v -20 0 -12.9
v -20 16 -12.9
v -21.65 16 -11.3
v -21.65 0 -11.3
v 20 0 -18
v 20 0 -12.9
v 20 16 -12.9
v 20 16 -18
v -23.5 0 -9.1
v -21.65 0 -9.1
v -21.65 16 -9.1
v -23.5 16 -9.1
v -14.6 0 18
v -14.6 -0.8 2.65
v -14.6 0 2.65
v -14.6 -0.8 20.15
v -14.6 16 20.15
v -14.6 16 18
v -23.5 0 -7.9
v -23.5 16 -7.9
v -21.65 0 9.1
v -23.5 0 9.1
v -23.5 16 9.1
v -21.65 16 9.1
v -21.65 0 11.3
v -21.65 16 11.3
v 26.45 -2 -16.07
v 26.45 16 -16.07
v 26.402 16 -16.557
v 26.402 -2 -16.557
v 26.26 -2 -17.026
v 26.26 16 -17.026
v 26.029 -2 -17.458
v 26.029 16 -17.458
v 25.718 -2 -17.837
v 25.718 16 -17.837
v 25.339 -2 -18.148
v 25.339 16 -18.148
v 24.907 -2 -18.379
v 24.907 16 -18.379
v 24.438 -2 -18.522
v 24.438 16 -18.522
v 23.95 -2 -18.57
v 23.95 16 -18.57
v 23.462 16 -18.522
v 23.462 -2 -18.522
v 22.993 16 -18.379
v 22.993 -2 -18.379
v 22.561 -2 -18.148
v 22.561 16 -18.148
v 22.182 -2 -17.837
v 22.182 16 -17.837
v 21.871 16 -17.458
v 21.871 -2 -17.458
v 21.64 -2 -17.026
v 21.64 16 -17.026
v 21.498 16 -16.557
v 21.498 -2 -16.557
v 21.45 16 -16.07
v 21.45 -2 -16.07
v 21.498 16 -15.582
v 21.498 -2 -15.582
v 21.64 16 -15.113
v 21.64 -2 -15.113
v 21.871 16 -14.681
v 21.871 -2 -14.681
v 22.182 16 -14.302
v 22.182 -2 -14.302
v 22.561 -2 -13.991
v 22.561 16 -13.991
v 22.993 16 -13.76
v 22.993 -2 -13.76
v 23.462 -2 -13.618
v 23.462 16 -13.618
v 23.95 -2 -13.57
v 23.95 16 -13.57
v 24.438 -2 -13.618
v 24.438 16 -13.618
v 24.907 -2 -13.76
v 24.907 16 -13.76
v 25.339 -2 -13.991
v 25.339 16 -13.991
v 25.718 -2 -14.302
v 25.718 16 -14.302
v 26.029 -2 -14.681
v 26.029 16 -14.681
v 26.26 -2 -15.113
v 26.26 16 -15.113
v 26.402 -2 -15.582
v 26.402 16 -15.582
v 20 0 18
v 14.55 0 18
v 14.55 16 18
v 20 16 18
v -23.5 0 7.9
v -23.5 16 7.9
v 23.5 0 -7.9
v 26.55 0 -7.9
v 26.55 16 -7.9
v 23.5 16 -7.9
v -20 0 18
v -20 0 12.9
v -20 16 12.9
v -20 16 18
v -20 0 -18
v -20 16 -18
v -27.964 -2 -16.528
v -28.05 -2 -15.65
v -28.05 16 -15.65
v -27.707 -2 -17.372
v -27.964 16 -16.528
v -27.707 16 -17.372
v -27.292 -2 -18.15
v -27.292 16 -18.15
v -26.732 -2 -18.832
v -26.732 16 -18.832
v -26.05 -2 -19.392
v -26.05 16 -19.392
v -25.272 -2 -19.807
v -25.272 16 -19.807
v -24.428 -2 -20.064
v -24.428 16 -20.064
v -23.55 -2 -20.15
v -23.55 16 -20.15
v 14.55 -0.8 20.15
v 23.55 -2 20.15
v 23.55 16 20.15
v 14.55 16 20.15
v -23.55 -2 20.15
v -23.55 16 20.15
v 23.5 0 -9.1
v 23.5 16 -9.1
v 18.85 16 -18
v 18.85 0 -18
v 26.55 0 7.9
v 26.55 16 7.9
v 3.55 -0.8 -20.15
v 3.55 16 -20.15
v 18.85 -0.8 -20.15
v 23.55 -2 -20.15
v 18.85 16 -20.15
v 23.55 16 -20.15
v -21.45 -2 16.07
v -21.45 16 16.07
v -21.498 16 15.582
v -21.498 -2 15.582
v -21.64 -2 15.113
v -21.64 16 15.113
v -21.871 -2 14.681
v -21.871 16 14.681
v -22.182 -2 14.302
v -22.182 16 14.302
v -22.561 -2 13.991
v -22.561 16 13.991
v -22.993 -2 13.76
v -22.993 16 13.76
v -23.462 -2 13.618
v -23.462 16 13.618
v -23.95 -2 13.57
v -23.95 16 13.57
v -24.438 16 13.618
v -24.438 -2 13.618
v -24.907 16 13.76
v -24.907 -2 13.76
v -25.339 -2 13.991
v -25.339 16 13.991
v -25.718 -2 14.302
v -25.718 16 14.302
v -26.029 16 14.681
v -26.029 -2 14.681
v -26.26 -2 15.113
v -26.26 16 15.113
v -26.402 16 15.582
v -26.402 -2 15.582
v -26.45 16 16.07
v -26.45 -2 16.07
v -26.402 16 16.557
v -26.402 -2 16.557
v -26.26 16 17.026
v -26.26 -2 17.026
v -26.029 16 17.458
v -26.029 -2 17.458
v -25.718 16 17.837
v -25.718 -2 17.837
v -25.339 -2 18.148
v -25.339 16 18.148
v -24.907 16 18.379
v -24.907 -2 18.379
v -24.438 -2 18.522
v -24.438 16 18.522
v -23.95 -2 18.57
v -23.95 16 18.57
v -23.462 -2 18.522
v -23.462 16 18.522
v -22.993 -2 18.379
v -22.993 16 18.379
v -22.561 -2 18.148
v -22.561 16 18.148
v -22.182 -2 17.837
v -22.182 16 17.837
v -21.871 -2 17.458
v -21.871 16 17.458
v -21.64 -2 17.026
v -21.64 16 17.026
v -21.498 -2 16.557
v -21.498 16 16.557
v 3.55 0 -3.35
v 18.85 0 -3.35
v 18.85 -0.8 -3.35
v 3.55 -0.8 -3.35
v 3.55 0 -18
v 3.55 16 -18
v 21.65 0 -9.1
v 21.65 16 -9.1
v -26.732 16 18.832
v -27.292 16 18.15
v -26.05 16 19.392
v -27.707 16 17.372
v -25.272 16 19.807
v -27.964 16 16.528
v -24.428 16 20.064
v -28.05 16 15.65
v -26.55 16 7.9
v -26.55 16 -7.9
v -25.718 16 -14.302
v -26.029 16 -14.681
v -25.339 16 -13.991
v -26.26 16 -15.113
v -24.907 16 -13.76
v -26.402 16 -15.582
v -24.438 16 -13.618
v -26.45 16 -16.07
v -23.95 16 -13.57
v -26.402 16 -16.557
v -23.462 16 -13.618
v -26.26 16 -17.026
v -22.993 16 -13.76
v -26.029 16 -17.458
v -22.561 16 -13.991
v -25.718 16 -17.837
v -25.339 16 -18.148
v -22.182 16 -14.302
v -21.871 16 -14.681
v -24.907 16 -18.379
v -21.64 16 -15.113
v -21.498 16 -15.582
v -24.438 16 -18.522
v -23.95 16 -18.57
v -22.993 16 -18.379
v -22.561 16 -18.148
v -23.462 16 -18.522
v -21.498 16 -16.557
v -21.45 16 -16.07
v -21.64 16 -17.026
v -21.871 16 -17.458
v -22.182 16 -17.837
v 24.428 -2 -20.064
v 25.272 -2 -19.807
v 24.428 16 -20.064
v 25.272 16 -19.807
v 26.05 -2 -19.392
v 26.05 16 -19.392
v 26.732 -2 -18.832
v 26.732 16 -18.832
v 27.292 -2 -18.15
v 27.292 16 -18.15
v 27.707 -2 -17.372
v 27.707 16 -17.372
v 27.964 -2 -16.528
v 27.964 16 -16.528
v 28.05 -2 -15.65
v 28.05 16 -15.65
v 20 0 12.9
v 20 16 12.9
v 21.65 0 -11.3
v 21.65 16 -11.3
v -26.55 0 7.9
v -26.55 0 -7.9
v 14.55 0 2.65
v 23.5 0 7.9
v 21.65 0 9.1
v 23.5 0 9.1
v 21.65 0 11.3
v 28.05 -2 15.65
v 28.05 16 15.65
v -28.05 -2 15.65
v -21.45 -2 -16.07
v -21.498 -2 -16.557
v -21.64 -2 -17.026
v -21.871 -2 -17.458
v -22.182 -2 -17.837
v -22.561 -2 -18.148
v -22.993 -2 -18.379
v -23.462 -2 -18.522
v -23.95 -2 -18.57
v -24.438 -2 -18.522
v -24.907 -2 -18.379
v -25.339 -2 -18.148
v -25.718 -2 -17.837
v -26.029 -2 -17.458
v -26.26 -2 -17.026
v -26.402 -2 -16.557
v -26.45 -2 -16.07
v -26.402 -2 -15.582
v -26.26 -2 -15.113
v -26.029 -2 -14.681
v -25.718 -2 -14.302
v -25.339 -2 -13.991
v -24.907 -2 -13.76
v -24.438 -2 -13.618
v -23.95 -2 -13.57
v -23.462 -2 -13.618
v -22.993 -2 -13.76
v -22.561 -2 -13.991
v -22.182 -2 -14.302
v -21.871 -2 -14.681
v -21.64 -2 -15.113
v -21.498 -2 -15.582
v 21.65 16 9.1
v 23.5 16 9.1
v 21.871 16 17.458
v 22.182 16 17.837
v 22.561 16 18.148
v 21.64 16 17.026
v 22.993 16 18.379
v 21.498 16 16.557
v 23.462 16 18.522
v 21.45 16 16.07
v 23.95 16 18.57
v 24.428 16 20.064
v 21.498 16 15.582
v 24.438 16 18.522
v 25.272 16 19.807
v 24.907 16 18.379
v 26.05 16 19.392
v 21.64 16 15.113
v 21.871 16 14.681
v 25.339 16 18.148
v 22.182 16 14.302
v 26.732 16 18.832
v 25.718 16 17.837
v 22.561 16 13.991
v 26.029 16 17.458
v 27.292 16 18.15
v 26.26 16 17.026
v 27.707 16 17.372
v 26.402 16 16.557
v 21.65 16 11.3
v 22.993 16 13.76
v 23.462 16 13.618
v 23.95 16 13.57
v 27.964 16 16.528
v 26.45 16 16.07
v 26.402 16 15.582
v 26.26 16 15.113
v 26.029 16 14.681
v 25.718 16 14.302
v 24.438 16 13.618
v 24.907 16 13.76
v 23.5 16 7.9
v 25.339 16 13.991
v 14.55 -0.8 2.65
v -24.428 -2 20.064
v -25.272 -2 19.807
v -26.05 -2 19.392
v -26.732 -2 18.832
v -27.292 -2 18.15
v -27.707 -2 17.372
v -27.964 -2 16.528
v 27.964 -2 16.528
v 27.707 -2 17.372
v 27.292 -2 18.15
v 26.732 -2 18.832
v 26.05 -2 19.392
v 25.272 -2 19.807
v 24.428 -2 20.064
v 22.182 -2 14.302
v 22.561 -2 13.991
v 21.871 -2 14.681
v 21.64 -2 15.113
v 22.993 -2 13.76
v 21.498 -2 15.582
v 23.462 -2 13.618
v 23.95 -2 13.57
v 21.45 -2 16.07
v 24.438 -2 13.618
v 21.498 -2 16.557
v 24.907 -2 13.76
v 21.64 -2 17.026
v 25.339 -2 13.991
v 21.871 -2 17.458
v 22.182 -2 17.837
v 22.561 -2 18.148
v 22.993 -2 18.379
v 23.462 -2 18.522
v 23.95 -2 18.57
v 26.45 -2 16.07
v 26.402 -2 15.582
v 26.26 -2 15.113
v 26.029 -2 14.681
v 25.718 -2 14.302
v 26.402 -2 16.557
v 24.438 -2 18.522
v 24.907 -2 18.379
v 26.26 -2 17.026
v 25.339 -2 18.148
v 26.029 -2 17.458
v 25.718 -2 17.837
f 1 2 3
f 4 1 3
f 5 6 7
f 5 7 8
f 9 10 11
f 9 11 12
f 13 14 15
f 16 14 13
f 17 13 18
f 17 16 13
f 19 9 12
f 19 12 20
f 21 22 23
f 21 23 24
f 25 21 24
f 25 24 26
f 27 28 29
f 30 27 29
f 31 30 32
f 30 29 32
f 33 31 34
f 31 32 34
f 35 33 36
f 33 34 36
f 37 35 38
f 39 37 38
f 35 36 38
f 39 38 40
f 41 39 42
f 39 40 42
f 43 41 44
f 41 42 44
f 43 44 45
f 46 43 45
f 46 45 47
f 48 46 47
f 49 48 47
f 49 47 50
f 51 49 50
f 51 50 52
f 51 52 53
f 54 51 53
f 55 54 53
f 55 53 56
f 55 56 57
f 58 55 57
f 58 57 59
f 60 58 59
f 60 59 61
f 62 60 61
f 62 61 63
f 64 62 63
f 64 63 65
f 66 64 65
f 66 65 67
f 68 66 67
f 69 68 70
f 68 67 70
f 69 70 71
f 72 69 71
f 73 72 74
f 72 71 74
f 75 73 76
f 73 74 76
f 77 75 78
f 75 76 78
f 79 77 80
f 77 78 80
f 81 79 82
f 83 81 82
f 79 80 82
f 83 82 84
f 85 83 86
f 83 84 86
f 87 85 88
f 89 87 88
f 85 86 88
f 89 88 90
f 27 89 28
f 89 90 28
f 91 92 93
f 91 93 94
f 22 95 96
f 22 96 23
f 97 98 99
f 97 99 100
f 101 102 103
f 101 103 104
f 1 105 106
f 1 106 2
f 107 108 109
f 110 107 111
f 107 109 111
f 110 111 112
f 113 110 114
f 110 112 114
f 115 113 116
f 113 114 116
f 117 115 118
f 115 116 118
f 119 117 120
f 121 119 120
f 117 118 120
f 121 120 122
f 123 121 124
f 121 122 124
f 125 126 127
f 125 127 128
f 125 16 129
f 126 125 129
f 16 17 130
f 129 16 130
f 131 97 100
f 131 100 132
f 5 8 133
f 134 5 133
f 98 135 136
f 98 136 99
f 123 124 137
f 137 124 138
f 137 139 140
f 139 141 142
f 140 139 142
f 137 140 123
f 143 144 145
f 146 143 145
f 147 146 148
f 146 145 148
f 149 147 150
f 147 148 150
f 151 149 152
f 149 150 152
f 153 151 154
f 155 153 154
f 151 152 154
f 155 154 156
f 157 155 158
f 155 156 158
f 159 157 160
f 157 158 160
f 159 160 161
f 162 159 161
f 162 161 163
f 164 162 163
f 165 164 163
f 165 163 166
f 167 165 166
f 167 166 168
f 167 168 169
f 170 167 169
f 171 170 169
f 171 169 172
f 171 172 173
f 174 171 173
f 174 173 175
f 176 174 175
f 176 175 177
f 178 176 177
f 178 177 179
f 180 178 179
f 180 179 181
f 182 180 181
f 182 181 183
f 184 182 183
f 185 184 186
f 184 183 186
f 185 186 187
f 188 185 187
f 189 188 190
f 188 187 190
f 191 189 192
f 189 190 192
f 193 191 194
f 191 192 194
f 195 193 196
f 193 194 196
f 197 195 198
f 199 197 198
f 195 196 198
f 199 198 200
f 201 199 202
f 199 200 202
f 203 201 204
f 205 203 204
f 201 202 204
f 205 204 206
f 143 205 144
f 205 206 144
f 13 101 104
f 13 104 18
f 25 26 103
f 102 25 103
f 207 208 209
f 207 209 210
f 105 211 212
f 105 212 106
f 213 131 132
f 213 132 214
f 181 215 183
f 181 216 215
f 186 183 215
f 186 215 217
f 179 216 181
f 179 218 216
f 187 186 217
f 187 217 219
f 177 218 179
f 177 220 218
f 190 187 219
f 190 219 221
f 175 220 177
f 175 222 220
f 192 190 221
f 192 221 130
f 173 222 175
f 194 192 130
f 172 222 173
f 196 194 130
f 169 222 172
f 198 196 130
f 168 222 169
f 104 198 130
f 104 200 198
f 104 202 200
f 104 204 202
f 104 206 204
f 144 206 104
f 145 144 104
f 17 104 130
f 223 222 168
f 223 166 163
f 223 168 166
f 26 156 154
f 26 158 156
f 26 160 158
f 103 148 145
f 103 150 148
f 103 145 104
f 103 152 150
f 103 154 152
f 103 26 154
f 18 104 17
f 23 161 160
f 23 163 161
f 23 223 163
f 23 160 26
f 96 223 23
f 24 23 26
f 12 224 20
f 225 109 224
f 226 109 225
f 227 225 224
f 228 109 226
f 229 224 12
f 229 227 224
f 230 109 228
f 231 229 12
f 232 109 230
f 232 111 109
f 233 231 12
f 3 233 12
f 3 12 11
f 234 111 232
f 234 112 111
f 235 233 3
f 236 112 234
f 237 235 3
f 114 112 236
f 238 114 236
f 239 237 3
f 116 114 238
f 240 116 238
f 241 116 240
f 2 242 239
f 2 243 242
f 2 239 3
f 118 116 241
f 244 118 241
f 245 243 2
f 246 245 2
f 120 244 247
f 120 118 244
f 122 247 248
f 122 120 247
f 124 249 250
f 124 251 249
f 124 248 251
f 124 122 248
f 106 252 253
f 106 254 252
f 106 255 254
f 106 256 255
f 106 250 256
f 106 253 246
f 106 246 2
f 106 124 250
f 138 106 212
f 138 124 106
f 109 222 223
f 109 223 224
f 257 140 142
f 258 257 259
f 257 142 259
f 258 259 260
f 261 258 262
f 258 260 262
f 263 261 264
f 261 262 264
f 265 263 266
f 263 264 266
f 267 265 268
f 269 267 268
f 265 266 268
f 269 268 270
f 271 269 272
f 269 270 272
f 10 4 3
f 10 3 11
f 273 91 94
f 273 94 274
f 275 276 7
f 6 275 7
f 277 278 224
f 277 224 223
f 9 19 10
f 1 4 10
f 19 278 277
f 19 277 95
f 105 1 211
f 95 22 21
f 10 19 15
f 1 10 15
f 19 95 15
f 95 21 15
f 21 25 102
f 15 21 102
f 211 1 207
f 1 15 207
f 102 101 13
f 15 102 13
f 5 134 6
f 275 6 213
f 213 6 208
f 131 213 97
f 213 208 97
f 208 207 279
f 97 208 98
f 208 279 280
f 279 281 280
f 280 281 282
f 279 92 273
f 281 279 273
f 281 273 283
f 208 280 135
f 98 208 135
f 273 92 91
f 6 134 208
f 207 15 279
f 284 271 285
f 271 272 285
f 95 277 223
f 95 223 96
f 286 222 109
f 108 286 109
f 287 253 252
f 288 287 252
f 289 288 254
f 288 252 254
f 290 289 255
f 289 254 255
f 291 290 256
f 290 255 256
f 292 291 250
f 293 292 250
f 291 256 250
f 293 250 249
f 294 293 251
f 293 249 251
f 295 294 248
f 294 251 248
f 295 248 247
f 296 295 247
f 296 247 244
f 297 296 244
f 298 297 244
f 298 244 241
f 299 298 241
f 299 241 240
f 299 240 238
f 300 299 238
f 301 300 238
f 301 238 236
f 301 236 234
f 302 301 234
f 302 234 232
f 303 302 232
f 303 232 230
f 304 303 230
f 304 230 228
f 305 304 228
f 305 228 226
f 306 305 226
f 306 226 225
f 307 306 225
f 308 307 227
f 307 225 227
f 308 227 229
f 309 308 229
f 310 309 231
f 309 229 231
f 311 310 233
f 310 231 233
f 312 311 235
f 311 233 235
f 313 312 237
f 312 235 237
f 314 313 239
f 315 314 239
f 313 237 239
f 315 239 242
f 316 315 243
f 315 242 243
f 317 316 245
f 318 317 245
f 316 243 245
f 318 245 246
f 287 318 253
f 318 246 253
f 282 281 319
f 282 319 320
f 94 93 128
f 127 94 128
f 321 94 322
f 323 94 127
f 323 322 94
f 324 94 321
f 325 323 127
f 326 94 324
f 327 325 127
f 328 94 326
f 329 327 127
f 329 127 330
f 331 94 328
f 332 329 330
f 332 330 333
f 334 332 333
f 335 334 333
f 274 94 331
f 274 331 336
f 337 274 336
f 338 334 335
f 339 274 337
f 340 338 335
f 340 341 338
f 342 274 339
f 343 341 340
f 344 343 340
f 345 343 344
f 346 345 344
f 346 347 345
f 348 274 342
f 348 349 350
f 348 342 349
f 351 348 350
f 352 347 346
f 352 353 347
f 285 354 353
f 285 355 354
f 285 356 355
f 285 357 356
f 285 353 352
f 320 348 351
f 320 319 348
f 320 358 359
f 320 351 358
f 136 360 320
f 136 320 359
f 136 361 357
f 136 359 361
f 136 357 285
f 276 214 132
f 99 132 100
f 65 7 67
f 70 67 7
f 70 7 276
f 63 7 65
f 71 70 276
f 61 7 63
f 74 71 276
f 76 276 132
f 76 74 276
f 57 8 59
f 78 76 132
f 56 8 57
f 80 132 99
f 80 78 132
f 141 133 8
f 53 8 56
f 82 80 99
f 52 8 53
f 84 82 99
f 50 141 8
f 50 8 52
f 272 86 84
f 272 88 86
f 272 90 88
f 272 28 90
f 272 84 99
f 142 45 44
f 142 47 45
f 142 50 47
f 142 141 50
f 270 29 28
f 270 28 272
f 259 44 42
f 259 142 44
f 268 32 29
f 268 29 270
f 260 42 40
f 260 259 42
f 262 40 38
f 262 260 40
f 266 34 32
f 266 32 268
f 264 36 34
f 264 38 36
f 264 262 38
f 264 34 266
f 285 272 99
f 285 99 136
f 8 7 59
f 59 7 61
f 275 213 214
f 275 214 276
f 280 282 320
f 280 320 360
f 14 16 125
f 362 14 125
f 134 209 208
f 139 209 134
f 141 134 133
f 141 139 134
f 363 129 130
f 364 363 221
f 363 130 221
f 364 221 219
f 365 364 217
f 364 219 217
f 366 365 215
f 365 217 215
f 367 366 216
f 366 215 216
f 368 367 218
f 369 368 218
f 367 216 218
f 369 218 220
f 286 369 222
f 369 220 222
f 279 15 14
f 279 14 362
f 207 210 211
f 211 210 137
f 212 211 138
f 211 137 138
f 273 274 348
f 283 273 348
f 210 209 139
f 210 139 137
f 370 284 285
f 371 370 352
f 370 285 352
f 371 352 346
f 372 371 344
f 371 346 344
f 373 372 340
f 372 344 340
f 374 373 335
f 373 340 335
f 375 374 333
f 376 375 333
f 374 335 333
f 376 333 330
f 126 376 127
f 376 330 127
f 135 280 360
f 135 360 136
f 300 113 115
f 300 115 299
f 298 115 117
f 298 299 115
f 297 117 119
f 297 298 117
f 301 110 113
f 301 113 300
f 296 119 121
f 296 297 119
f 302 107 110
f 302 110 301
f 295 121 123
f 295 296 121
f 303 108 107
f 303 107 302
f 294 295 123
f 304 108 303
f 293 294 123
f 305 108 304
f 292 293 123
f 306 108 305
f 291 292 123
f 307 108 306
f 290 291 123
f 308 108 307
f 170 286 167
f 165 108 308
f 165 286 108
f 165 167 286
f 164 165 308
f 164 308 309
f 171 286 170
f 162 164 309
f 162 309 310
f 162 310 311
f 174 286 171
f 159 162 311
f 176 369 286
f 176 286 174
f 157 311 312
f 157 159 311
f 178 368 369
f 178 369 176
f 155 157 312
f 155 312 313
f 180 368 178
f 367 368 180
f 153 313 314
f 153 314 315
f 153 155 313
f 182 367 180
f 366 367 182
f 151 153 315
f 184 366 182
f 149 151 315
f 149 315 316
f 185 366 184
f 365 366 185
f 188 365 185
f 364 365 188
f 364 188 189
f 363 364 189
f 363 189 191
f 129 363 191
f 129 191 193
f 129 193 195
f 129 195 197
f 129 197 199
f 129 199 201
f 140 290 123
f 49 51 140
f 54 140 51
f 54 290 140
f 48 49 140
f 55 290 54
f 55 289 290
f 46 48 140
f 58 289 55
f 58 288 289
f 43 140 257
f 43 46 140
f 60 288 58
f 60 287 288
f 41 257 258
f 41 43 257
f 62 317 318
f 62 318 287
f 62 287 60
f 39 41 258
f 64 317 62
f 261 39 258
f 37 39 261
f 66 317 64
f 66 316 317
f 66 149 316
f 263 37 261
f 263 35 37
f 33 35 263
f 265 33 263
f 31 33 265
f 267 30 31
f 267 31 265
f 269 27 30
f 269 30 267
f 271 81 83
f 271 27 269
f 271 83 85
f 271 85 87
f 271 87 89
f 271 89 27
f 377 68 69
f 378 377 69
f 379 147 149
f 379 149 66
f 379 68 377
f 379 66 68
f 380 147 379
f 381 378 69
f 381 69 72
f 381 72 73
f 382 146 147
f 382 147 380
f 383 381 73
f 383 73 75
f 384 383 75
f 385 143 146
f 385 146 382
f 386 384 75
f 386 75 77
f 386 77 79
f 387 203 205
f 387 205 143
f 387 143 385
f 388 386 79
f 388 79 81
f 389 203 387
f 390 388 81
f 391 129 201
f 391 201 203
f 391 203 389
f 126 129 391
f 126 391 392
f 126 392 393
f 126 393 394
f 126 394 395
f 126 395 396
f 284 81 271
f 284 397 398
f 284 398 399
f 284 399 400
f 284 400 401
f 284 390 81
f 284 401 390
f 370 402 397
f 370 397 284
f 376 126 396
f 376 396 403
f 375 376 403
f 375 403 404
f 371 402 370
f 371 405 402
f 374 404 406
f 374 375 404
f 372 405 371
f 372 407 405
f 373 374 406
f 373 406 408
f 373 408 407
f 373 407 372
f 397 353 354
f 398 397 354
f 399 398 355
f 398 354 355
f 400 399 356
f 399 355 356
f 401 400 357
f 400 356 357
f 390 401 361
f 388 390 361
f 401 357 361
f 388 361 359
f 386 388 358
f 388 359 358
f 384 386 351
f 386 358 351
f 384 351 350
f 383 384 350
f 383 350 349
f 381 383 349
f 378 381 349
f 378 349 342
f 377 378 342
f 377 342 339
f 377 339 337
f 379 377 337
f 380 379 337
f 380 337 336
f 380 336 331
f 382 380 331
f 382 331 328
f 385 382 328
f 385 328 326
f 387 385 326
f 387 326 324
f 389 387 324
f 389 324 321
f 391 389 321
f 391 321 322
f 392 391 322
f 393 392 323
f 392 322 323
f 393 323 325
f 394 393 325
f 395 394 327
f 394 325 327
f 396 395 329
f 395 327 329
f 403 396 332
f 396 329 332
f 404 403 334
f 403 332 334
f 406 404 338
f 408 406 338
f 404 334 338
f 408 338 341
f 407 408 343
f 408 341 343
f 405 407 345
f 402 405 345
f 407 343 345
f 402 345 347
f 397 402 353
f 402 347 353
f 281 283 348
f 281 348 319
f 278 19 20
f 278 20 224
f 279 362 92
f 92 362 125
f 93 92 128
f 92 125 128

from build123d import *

# Parameters (mm, degrees)
BOSS_EXTRUDE1_DEPTH = 16
BOSS_EXTRUDE2_DEPTH = 2
SKETCH3_W           = 15.3
SKETCH3_H           = 16.8
CUT_EXTRUDE1_DEPTH  = 16.8
SKETCH4_R           = 2.5
CUT_EXTRUDE2_DEPTH  = 19
SKETCH5_W           = 29.15
SKETCH5_H           = 16.8
CUT_EXTRUDE3_DEPTH  = 17.5


with BuildPart() as part:
    # Sketch1 → Boss-Extrude1 (new body)
    with BuildSketch(Plane(origin=(0, 0, 0), x_dir=(1, 0, 0), z_dir=(0, 1, 0))):
        with BuildLine():
            Line((23.55, 20.15), (-23.55, 20.15))
            ThreePointArc((-23.55, 20.15), (-26.731980515, 18.831980515), (-28.05, 15.65))
            Line((-28.05, 15.65), (-28.05, -15.65))
            ThreePointArc((-28.05, -15.65), (-26.731980515, -18.831980515), (-23.55, -20.15))
            Line((-23.55, -20.15), (23.55, -20.15))
            ThreePointArc((23.55, -20.15), (26.731980515, -18.831980515), (28.05, -15.65))
            Line((28.05, -15.65), (28.05, 15.65))
            ThreePointArc((28.05, 15.65), (26.731980515, 18.831980515), (23.55, 20.15))
        make_face()
        Polygon((-20, -18), (20, -18), (20, -12.9), (21.65, -11.3), (21.65, -9.1), (23.5, -9.1), (23.5, -7.9), (26.55, -7.9), (26.55, 7.9), (23.5, 7.9), (23.5, 9.1), (21.65, 9.1), (21.65, 11.3), (20, 12.9), (20, 18), (-20, 18), (-20, 12.9), (-21.65, 11.3), (-21.65, 9.1), (-23.5, 9.1), (-23.5, 7.9), (-26.55, 7.9), (-26.55, -7.9), (-23.5, -7.9), (-23.5, -9.1), (-21.65, -9.1), (-21.65, -11.3), (-20, -12.9), align=None, mode=Mode.SUBTRACT)
    extrude(amount=BOSS_EXTRUDE1_DEPTH)

    # Sketch2 → Boss-Extrude2 (add)
    with BuildSketch(Plane.XZ):
        with BuildLine():
            Line((-23.55, -20.15), (23.55, -20.15))
            ThreePointArc((23.55, -20.15), (26.731980515, -18.831980515), (28.05, -15.65))
            Line((28.05, -15.65), (28.05, 15.65))
            ThreePointArc((28.05, 15.65), (26.731980515, 18.831980515), (23.55, 20.15))
            Line((23.55, 20.15), (-23.55, 20.15))
            ThreePointArc((-23.55, 20.15), (-26.731980515, 18.831980515), (-28.05, 15.65))
            Line((-28.05, 15.65), (-28.05, -15.65))
            ThreePointArc((-28.05, -15.65), (-26.731980515, -18.831980515), (-23.55, -20.15))
        make_face()
    extrude(amount=BOSS_EXTRUDE2_DEPTH)

    # Sketch3 → Cut-Extrude1 (cut)
    with BuildSketch(Plane(origin=(0, 0, -20.15), x_dir=(-1, 0, 0), z_dir=(0, 0, -1))):
        with Locations((-11.2, 7.6)):
            Rectangle(SKETCH3_W, SKETCH3_H)
    extrude(amount=-CUT_EXTRUDE1_DEPTH, mode=Mode.SUBTRACT)

    # Sketch4 → Cut-Extrude2 (cut, through all)
    with BuildSketch(Plane(origin=(0, 16, 0), x_dir=(1, 0, 0), z_dir=(0, 1, 0))):
        with Locations((23.95, 16.069558847)):
            Circle(SKETCH4_R)
        with Locations((23.95, -16.069558847)):
            Circle(SKETCH4_R)
        with Locations((-23.95, 16.069558847)):
            Circle(SKETCH4_R)
        with Locations((-23.95, -16.069558847)):
            Circle(SKETCH4_R)
    extrude(amount=-CUT_EXTRUDE2_DEPTH, mode=Mode.SUBTRACT)

    # Sketch5 → Cut-Extrude3 (cut)
    with BuildSketch(Plane.XY.offset(20.15)):
        with Locations((-0.025, 7.6)):
            Rectangle(SKETCH5_W, SKETCH5_H)
    extrude(amount=-CUT_EXTRUDE3_DEPTH, mode=Mode.SUBTRACT)


solid = part.part
